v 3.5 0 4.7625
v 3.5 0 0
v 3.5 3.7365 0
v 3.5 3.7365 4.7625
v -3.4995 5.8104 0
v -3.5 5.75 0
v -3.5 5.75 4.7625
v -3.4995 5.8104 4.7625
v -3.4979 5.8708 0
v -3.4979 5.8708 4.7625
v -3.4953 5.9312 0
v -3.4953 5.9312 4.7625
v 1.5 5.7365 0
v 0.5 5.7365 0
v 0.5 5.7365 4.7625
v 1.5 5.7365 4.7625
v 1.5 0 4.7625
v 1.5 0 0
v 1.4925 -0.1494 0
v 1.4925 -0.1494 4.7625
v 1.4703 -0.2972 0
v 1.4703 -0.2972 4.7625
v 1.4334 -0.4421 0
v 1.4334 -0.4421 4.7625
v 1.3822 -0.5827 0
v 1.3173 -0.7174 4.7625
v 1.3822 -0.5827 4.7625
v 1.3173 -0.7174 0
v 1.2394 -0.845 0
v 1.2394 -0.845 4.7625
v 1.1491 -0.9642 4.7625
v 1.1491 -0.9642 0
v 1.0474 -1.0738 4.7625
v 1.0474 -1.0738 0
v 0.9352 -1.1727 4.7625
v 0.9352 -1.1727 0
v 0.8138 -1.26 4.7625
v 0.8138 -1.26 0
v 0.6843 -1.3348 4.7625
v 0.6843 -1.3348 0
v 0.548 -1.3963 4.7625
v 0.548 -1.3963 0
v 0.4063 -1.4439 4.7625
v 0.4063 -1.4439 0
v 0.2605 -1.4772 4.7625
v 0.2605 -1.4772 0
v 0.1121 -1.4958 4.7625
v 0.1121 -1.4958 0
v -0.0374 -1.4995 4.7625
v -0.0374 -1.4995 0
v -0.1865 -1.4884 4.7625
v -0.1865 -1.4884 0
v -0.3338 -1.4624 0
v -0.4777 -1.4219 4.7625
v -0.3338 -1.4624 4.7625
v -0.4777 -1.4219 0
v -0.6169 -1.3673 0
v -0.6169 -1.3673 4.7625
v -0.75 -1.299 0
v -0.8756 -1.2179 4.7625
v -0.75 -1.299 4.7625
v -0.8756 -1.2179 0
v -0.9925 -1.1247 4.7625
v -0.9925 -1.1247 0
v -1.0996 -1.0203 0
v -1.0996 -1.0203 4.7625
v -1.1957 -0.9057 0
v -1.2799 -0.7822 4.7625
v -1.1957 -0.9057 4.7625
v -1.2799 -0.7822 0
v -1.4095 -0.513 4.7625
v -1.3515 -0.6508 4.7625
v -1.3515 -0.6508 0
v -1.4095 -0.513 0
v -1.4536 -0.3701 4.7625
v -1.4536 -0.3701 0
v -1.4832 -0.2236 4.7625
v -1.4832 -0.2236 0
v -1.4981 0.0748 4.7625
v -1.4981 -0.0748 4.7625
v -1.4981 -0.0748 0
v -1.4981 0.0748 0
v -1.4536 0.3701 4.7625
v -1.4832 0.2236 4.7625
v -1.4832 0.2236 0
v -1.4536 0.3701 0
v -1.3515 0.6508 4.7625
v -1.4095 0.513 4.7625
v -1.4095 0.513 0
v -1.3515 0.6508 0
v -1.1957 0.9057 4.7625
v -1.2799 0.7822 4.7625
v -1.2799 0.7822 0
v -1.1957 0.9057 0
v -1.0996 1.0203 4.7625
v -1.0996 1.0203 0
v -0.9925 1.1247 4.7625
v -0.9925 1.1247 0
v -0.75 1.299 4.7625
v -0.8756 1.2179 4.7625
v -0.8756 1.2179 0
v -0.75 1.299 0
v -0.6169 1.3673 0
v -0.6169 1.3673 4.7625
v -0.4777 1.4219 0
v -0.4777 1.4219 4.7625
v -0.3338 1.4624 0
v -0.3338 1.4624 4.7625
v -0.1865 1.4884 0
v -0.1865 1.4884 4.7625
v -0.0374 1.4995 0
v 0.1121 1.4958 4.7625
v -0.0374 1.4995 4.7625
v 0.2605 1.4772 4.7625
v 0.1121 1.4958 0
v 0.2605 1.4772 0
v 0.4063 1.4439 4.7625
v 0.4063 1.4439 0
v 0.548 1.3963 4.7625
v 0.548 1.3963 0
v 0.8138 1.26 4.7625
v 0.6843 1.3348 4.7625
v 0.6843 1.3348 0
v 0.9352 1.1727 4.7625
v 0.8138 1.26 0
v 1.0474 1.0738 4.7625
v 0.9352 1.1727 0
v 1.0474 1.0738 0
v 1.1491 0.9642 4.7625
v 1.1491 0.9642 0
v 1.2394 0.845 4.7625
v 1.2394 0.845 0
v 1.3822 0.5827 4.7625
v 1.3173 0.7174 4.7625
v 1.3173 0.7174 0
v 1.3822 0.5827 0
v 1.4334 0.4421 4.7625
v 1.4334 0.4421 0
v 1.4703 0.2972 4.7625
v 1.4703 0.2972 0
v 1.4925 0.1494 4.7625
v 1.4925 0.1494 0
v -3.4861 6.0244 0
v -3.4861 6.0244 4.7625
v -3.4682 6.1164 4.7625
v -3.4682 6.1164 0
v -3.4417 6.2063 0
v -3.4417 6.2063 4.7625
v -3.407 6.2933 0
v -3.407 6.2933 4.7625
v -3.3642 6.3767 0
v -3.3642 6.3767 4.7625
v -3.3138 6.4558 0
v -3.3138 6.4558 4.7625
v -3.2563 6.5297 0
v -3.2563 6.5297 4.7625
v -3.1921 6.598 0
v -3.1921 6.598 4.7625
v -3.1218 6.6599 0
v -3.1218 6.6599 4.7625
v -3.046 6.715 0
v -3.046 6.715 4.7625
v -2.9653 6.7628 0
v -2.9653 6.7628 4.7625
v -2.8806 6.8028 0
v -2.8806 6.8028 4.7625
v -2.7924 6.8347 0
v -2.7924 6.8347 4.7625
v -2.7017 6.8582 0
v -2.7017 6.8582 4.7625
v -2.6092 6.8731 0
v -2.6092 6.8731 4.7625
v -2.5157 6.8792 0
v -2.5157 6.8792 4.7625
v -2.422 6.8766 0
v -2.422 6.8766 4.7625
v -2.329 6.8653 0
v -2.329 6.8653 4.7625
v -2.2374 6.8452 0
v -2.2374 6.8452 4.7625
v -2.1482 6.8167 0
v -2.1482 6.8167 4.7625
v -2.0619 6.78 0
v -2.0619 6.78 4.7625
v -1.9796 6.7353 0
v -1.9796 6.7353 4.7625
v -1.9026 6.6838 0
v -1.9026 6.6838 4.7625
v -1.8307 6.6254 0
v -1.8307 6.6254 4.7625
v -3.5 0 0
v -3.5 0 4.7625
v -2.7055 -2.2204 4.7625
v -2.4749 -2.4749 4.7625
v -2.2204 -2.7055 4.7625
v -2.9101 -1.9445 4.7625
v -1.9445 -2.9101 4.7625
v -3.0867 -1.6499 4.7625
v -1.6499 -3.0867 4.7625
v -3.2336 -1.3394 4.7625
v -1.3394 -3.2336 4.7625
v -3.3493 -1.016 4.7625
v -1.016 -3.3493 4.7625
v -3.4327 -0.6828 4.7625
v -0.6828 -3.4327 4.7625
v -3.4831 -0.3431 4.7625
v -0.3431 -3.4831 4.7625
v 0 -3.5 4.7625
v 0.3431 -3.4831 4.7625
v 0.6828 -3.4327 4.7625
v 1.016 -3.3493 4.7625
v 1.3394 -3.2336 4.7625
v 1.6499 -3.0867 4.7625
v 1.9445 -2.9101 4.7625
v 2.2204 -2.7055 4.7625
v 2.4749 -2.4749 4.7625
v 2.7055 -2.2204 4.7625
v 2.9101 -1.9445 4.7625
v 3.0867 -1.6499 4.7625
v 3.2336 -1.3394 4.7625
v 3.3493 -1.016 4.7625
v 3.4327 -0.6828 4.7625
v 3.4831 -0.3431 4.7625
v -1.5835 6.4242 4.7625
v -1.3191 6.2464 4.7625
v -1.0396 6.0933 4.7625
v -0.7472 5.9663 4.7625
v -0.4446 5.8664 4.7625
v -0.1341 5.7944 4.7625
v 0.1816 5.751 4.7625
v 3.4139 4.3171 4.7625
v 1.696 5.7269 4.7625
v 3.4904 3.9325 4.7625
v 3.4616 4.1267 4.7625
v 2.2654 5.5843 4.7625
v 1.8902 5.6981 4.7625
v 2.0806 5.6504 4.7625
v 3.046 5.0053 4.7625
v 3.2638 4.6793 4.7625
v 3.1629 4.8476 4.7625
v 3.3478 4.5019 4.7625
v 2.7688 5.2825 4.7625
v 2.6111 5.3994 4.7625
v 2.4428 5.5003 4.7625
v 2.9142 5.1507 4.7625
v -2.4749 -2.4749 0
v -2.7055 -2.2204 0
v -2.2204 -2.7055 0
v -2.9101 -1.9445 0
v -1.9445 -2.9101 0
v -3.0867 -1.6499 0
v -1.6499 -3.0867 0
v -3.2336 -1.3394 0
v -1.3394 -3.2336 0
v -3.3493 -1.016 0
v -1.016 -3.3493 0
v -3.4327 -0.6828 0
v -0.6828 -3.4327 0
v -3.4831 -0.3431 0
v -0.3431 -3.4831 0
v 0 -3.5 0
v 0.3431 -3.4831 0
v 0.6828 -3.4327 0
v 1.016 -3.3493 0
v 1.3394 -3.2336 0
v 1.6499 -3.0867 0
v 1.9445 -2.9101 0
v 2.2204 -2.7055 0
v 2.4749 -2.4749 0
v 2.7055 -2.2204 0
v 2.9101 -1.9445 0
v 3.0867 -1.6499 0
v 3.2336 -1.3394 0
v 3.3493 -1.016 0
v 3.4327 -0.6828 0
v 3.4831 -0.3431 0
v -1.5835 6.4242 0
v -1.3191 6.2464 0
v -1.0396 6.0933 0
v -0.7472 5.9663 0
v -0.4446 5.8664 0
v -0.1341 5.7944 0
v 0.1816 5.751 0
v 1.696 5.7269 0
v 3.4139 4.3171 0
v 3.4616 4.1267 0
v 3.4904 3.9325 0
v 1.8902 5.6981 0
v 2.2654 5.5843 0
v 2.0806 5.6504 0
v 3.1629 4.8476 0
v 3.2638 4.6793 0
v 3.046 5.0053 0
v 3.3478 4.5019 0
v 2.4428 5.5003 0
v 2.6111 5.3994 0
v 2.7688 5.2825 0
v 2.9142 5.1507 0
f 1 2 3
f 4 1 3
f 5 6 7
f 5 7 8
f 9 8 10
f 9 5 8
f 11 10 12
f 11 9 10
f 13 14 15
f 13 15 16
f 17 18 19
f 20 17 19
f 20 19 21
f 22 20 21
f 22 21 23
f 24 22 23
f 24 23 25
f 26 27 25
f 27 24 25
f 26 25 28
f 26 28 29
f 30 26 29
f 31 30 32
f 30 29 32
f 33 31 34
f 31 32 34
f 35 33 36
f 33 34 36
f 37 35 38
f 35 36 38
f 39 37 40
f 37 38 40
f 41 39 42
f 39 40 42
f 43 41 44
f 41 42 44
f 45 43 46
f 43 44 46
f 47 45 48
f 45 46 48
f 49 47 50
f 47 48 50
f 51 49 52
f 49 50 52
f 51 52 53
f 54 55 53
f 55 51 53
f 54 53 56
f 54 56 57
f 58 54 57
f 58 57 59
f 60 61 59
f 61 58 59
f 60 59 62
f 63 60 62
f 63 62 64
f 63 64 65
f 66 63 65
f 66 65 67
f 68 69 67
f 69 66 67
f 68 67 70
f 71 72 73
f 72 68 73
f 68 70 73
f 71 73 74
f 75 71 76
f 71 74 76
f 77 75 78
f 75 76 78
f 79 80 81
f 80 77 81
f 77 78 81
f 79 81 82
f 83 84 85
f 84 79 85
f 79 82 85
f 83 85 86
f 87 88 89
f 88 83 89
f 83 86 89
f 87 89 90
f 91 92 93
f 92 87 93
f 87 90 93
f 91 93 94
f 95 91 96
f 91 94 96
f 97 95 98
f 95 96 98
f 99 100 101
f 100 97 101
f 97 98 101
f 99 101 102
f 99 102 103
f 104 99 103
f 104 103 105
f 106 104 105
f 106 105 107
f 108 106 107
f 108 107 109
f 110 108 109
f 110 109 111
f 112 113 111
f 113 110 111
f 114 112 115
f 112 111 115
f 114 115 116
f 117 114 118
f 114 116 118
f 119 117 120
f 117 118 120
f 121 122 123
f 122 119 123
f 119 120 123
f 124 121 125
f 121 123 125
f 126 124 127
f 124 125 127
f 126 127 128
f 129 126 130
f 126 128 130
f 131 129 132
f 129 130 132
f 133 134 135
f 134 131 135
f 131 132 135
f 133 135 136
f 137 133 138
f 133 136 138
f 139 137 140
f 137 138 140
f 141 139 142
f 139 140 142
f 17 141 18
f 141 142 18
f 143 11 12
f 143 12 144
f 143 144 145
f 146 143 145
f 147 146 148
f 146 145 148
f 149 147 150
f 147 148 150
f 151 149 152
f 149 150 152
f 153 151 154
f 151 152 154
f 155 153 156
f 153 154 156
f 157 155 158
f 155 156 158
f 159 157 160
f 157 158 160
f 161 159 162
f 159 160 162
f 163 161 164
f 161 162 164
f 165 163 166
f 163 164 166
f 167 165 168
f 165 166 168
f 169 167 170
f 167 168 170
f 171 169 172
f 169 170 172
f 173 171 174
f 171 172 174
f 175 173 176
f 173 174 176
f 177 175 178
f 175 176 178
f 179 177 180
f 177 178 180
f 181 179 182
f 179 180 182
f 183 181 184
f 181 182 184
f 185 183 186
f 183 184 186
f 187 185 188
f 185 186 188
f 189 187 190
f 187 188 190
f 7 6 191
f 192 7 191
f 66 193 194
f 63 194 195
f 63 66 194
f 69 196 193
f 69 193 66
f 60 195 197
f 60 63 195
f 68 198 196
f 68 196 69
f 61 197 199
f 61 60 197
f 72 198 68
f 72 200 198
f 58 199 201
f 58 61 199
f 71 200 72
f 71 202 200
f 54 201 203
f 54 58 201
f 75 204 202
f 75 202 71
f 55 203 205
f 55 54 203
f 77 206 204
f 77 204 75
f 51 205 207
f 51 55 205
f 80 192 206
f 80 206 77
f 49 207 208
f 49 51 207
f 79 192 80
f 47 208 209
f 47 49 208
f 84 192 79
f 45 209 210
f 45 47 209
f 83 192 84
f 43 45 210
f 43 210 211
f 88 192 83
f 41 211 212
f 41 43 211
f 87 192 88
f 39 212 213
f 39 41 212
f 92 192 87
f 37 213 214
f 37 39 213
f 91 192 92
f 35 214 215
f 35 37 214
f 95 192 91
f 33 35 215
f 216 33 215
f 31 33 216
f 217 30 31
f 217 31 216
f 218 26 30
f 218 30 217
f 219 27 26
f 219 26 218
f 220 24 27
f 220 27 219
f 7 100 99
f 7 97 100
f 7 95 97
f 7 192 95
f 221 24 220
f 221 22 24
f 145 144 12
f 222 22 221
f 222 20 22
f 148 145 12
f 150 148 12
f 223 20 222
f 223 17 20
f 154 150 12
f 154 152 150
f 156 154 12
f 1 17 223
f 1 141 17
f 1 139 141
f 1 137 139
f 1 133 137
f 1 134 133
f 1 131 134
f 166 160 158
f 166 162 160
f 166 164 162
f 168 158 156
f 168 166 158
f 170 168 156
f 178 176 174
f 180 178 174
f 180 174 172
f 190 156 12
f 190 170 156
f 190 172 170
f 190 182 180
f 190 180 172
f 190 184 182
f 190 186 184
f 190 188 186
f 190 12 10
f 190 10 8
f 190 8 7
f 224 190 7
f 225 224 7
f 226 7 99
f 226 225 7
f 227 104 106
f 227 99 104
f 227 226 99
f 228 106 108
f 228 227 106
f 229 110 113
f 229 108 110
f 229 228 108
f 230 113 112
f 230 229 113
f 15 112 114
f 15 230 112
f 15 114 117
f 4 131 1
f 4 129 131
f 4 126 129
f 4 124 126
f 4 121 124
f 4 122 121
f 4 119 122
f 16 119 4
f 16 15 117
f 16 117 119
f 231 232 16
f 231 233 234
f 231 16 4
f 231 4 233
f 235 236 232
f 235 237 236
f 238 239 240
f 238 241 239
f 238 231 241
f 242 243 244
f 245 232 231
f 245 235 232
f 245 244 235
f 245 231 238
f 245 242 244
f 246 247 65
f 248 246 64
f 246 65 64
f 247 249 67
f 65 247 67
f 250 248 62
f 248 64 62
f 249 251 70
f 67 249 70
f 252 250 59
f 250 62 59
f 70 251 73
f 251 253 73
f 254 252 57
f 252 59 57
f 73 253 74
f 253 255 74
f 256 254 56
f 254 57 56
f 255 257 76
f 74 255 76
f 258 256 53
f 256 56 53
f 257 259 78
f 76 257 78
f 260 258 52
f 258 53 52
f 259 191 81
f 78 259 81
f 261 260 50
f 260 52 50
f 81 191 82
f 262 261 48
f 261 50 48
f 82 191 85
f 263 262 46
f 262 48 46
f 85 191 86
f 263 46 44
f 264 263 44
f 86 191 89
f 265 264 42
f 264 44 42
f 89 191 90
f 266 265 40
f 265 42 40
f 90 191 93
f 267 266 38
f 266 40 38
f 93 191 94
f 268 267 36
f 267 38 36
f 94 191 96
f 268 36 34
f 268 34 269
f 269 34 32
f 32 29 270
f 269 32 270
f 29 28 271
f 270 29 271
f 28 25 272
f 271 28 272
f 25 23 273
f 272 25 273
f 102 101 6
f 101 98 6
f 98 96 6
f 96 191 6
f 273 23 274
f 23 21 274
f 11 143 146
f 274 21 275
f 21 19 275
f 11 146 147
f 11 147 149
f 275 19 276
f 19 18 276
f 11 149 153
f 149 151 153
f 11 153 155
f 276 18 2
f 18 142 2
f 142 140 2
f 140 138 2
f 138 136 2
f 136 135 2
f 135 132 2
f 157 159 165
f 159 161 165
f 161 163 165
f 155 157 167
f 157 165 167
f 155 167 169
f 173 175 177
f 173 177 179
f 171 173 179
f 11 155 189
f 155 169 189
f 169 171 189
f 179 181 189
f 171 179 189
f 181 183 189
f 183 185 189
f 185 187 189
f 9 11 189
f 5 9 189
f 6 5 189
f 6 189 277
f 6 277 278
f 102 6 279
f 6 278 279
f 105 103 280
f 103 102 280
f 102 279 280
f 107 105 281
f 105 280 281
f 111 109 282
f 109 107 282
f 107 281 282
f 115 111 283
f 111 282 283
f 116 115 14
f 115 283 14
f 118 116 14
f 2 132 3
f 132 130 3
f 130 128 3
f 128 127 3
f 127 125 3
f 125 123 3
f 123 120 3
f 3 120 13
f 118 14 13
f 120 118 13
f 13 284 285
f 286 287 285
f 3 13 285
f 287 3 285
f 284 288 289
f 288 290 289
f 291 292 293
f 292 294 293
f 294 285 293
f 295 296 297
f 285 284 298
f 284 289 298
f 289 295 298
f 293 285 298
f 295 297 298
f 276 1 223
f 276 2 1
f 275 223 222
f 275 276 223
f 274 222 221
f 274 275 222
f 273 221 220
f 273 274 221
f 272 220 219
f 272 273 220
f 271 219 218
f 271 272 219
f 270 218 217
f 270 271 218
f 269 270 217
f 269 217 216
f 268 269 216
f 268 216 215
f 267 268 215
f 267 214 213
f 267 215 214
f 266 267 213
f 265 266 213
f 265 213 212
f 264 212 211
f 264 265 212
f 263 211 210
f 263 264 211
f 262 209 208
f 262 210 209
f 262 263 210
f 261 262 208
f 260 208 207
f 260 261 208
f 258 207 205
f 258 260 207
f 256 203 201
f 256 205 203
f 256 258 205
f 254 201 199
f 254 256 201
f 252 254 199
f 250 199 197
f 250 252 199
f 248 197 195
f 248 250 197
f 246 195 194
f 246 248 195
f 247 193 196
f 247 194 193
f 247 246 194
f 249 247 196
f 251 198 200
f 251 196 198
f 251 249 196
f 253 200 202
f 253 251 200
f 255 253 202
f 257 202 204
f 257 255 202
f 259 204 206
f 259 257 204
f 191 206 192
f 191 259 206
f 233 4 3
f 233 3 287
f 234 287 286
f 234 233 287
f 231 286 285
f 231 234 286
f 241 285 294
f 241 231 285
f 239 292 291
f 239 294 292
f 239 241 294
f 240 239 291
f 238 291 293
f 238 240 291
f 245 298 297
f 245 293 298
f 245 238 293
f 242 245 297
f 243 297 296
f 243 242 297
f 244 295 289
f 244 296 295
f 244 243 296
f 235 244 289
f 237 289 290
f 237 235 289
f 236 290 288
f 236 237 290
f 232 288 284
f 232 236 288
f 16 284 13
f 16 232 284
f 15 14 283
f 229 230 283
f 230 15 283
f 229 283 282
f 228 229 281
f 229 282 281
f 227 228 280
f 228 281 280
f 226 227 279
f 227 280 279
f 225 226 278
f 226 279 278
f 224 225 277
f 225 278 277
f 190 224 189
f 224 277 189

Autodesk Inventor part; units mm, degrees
ref_plane "YZ Plane" through (0, 0, 0) normal (1, 0, 0) x (0, 1, 0)
ref_plane "XZ Plane" through (0, 0, 0) normal (0, 1, 0) x (-1, 0, 0)
ref_plane "XY Plane" through (0, 0, 0) normal (0, 0, 1) x (1, 0, 0)
sketch "Sketch1" plane through (0, 0, 0) normal (0, 0, 1) x (1, 0, 0)
  circle A0 centre (0, 0) radius 1.5
  circle A1 centre (0, 0) radius 3.5
  circle A2 centre (0, 0) radius 5.75 construction
  line L0 (0, 0) -> (0, 5.75) construction
  circle A3 centre (0.5, 9.2365) radius 3.5
  line L1 (0, 0) -> (0, 5.75) construction
  line L2 (3.5, 0) -> (3.5, 5.75)
  line L3 (-3.5, 5.75) -> (-3.5, 0)
  arc A4 (-3.5, 0) -> (3.5, 0) centre (0, 0) ccw
  arc A5 (3.5, 5.75) -> (-1.9961, 2.875) centre (0, 5.75) ccw
  arc A6 (-3.4062, 0.805) -> (-3.4062, 4.945) centre (-12.1649, 2.875) ccw
  line L4 (0.5, 5.7365) -> (3.5, 5.7365)
  point P0 (0, 2.875)
  point P1 (-3.4345, 6.424)
  point P2 (3.5, 0)
  point P3 (3.244, 7.0639)
  point P4 (-3.5, 0)
  point P5 (-2.744, 7.9226)
  dimension "d2" = 11.5
  dimension "d3" = 7
  dimension "d0" = 3
  dimension "d1" = 7
  dimension "d4" = 3.5
  dimension "d9" = 0.5
  dimension "d10" = 9
extrude "Extrusion1" add sketch "Sketch1" along normal blind 4.7625 contours A1 | A1 A5 A3 L4 L2 | A1 A6 A5 | L3 A5 A6 A1
fillet "Fillet1" radius 1 1 edges at (-2.744, 7.9226, 2.3813)
fillet "Fillet2" radius 2 1 edges at (3.5, 5.7365, 2.3813)
sketch "Sketch2" plane through (0, 0, 0) normal (0, 0, -1) x (-1, 0, 0)
  line L0 (-3.5, 0) -> (-3.5, 3.7365) projected
  arc A0 (-3.5, 0) -> (3.5, 0) centre (0, 0) ccw projected
  circle A1 centre (0, 0) radius 1.5 projected
  circle A2 centre (0, 0) radius 6.0263 construction
  arc A3 (3.4953, 5.9311) -> (1.8307, 6.6254) centre (2.4966, 5.8794) ccw projected
  arc A4 (-0.5, 5.7365) -> (1.8307, 6.6254) centre (-0.5, 9.2365) ccw projected
  line L1 (3.5, 5.75) -> (3.5, 0) projected
  line L2 (-1.5, 5.7365) -> (-0.5, 5.7365) projected
  arc A5 (-1.5, 5.7365) -> (-3.5, 3.7365) centre (-1.5, 3.7365) ccw projected
  arc A6 (-1.5, 5.7365) -> (-3.5, 3.7365) centre (-1.5, 3.7365) ccw projected
  arc A7 (3.5, 5.75) -> (3.4953, 5.9311) centre (0, 5.75) ccw projected
equation "\"d4\" = 0.5 * d1"
properties part number "Cam - Lever" material "Nylon 6/6"
